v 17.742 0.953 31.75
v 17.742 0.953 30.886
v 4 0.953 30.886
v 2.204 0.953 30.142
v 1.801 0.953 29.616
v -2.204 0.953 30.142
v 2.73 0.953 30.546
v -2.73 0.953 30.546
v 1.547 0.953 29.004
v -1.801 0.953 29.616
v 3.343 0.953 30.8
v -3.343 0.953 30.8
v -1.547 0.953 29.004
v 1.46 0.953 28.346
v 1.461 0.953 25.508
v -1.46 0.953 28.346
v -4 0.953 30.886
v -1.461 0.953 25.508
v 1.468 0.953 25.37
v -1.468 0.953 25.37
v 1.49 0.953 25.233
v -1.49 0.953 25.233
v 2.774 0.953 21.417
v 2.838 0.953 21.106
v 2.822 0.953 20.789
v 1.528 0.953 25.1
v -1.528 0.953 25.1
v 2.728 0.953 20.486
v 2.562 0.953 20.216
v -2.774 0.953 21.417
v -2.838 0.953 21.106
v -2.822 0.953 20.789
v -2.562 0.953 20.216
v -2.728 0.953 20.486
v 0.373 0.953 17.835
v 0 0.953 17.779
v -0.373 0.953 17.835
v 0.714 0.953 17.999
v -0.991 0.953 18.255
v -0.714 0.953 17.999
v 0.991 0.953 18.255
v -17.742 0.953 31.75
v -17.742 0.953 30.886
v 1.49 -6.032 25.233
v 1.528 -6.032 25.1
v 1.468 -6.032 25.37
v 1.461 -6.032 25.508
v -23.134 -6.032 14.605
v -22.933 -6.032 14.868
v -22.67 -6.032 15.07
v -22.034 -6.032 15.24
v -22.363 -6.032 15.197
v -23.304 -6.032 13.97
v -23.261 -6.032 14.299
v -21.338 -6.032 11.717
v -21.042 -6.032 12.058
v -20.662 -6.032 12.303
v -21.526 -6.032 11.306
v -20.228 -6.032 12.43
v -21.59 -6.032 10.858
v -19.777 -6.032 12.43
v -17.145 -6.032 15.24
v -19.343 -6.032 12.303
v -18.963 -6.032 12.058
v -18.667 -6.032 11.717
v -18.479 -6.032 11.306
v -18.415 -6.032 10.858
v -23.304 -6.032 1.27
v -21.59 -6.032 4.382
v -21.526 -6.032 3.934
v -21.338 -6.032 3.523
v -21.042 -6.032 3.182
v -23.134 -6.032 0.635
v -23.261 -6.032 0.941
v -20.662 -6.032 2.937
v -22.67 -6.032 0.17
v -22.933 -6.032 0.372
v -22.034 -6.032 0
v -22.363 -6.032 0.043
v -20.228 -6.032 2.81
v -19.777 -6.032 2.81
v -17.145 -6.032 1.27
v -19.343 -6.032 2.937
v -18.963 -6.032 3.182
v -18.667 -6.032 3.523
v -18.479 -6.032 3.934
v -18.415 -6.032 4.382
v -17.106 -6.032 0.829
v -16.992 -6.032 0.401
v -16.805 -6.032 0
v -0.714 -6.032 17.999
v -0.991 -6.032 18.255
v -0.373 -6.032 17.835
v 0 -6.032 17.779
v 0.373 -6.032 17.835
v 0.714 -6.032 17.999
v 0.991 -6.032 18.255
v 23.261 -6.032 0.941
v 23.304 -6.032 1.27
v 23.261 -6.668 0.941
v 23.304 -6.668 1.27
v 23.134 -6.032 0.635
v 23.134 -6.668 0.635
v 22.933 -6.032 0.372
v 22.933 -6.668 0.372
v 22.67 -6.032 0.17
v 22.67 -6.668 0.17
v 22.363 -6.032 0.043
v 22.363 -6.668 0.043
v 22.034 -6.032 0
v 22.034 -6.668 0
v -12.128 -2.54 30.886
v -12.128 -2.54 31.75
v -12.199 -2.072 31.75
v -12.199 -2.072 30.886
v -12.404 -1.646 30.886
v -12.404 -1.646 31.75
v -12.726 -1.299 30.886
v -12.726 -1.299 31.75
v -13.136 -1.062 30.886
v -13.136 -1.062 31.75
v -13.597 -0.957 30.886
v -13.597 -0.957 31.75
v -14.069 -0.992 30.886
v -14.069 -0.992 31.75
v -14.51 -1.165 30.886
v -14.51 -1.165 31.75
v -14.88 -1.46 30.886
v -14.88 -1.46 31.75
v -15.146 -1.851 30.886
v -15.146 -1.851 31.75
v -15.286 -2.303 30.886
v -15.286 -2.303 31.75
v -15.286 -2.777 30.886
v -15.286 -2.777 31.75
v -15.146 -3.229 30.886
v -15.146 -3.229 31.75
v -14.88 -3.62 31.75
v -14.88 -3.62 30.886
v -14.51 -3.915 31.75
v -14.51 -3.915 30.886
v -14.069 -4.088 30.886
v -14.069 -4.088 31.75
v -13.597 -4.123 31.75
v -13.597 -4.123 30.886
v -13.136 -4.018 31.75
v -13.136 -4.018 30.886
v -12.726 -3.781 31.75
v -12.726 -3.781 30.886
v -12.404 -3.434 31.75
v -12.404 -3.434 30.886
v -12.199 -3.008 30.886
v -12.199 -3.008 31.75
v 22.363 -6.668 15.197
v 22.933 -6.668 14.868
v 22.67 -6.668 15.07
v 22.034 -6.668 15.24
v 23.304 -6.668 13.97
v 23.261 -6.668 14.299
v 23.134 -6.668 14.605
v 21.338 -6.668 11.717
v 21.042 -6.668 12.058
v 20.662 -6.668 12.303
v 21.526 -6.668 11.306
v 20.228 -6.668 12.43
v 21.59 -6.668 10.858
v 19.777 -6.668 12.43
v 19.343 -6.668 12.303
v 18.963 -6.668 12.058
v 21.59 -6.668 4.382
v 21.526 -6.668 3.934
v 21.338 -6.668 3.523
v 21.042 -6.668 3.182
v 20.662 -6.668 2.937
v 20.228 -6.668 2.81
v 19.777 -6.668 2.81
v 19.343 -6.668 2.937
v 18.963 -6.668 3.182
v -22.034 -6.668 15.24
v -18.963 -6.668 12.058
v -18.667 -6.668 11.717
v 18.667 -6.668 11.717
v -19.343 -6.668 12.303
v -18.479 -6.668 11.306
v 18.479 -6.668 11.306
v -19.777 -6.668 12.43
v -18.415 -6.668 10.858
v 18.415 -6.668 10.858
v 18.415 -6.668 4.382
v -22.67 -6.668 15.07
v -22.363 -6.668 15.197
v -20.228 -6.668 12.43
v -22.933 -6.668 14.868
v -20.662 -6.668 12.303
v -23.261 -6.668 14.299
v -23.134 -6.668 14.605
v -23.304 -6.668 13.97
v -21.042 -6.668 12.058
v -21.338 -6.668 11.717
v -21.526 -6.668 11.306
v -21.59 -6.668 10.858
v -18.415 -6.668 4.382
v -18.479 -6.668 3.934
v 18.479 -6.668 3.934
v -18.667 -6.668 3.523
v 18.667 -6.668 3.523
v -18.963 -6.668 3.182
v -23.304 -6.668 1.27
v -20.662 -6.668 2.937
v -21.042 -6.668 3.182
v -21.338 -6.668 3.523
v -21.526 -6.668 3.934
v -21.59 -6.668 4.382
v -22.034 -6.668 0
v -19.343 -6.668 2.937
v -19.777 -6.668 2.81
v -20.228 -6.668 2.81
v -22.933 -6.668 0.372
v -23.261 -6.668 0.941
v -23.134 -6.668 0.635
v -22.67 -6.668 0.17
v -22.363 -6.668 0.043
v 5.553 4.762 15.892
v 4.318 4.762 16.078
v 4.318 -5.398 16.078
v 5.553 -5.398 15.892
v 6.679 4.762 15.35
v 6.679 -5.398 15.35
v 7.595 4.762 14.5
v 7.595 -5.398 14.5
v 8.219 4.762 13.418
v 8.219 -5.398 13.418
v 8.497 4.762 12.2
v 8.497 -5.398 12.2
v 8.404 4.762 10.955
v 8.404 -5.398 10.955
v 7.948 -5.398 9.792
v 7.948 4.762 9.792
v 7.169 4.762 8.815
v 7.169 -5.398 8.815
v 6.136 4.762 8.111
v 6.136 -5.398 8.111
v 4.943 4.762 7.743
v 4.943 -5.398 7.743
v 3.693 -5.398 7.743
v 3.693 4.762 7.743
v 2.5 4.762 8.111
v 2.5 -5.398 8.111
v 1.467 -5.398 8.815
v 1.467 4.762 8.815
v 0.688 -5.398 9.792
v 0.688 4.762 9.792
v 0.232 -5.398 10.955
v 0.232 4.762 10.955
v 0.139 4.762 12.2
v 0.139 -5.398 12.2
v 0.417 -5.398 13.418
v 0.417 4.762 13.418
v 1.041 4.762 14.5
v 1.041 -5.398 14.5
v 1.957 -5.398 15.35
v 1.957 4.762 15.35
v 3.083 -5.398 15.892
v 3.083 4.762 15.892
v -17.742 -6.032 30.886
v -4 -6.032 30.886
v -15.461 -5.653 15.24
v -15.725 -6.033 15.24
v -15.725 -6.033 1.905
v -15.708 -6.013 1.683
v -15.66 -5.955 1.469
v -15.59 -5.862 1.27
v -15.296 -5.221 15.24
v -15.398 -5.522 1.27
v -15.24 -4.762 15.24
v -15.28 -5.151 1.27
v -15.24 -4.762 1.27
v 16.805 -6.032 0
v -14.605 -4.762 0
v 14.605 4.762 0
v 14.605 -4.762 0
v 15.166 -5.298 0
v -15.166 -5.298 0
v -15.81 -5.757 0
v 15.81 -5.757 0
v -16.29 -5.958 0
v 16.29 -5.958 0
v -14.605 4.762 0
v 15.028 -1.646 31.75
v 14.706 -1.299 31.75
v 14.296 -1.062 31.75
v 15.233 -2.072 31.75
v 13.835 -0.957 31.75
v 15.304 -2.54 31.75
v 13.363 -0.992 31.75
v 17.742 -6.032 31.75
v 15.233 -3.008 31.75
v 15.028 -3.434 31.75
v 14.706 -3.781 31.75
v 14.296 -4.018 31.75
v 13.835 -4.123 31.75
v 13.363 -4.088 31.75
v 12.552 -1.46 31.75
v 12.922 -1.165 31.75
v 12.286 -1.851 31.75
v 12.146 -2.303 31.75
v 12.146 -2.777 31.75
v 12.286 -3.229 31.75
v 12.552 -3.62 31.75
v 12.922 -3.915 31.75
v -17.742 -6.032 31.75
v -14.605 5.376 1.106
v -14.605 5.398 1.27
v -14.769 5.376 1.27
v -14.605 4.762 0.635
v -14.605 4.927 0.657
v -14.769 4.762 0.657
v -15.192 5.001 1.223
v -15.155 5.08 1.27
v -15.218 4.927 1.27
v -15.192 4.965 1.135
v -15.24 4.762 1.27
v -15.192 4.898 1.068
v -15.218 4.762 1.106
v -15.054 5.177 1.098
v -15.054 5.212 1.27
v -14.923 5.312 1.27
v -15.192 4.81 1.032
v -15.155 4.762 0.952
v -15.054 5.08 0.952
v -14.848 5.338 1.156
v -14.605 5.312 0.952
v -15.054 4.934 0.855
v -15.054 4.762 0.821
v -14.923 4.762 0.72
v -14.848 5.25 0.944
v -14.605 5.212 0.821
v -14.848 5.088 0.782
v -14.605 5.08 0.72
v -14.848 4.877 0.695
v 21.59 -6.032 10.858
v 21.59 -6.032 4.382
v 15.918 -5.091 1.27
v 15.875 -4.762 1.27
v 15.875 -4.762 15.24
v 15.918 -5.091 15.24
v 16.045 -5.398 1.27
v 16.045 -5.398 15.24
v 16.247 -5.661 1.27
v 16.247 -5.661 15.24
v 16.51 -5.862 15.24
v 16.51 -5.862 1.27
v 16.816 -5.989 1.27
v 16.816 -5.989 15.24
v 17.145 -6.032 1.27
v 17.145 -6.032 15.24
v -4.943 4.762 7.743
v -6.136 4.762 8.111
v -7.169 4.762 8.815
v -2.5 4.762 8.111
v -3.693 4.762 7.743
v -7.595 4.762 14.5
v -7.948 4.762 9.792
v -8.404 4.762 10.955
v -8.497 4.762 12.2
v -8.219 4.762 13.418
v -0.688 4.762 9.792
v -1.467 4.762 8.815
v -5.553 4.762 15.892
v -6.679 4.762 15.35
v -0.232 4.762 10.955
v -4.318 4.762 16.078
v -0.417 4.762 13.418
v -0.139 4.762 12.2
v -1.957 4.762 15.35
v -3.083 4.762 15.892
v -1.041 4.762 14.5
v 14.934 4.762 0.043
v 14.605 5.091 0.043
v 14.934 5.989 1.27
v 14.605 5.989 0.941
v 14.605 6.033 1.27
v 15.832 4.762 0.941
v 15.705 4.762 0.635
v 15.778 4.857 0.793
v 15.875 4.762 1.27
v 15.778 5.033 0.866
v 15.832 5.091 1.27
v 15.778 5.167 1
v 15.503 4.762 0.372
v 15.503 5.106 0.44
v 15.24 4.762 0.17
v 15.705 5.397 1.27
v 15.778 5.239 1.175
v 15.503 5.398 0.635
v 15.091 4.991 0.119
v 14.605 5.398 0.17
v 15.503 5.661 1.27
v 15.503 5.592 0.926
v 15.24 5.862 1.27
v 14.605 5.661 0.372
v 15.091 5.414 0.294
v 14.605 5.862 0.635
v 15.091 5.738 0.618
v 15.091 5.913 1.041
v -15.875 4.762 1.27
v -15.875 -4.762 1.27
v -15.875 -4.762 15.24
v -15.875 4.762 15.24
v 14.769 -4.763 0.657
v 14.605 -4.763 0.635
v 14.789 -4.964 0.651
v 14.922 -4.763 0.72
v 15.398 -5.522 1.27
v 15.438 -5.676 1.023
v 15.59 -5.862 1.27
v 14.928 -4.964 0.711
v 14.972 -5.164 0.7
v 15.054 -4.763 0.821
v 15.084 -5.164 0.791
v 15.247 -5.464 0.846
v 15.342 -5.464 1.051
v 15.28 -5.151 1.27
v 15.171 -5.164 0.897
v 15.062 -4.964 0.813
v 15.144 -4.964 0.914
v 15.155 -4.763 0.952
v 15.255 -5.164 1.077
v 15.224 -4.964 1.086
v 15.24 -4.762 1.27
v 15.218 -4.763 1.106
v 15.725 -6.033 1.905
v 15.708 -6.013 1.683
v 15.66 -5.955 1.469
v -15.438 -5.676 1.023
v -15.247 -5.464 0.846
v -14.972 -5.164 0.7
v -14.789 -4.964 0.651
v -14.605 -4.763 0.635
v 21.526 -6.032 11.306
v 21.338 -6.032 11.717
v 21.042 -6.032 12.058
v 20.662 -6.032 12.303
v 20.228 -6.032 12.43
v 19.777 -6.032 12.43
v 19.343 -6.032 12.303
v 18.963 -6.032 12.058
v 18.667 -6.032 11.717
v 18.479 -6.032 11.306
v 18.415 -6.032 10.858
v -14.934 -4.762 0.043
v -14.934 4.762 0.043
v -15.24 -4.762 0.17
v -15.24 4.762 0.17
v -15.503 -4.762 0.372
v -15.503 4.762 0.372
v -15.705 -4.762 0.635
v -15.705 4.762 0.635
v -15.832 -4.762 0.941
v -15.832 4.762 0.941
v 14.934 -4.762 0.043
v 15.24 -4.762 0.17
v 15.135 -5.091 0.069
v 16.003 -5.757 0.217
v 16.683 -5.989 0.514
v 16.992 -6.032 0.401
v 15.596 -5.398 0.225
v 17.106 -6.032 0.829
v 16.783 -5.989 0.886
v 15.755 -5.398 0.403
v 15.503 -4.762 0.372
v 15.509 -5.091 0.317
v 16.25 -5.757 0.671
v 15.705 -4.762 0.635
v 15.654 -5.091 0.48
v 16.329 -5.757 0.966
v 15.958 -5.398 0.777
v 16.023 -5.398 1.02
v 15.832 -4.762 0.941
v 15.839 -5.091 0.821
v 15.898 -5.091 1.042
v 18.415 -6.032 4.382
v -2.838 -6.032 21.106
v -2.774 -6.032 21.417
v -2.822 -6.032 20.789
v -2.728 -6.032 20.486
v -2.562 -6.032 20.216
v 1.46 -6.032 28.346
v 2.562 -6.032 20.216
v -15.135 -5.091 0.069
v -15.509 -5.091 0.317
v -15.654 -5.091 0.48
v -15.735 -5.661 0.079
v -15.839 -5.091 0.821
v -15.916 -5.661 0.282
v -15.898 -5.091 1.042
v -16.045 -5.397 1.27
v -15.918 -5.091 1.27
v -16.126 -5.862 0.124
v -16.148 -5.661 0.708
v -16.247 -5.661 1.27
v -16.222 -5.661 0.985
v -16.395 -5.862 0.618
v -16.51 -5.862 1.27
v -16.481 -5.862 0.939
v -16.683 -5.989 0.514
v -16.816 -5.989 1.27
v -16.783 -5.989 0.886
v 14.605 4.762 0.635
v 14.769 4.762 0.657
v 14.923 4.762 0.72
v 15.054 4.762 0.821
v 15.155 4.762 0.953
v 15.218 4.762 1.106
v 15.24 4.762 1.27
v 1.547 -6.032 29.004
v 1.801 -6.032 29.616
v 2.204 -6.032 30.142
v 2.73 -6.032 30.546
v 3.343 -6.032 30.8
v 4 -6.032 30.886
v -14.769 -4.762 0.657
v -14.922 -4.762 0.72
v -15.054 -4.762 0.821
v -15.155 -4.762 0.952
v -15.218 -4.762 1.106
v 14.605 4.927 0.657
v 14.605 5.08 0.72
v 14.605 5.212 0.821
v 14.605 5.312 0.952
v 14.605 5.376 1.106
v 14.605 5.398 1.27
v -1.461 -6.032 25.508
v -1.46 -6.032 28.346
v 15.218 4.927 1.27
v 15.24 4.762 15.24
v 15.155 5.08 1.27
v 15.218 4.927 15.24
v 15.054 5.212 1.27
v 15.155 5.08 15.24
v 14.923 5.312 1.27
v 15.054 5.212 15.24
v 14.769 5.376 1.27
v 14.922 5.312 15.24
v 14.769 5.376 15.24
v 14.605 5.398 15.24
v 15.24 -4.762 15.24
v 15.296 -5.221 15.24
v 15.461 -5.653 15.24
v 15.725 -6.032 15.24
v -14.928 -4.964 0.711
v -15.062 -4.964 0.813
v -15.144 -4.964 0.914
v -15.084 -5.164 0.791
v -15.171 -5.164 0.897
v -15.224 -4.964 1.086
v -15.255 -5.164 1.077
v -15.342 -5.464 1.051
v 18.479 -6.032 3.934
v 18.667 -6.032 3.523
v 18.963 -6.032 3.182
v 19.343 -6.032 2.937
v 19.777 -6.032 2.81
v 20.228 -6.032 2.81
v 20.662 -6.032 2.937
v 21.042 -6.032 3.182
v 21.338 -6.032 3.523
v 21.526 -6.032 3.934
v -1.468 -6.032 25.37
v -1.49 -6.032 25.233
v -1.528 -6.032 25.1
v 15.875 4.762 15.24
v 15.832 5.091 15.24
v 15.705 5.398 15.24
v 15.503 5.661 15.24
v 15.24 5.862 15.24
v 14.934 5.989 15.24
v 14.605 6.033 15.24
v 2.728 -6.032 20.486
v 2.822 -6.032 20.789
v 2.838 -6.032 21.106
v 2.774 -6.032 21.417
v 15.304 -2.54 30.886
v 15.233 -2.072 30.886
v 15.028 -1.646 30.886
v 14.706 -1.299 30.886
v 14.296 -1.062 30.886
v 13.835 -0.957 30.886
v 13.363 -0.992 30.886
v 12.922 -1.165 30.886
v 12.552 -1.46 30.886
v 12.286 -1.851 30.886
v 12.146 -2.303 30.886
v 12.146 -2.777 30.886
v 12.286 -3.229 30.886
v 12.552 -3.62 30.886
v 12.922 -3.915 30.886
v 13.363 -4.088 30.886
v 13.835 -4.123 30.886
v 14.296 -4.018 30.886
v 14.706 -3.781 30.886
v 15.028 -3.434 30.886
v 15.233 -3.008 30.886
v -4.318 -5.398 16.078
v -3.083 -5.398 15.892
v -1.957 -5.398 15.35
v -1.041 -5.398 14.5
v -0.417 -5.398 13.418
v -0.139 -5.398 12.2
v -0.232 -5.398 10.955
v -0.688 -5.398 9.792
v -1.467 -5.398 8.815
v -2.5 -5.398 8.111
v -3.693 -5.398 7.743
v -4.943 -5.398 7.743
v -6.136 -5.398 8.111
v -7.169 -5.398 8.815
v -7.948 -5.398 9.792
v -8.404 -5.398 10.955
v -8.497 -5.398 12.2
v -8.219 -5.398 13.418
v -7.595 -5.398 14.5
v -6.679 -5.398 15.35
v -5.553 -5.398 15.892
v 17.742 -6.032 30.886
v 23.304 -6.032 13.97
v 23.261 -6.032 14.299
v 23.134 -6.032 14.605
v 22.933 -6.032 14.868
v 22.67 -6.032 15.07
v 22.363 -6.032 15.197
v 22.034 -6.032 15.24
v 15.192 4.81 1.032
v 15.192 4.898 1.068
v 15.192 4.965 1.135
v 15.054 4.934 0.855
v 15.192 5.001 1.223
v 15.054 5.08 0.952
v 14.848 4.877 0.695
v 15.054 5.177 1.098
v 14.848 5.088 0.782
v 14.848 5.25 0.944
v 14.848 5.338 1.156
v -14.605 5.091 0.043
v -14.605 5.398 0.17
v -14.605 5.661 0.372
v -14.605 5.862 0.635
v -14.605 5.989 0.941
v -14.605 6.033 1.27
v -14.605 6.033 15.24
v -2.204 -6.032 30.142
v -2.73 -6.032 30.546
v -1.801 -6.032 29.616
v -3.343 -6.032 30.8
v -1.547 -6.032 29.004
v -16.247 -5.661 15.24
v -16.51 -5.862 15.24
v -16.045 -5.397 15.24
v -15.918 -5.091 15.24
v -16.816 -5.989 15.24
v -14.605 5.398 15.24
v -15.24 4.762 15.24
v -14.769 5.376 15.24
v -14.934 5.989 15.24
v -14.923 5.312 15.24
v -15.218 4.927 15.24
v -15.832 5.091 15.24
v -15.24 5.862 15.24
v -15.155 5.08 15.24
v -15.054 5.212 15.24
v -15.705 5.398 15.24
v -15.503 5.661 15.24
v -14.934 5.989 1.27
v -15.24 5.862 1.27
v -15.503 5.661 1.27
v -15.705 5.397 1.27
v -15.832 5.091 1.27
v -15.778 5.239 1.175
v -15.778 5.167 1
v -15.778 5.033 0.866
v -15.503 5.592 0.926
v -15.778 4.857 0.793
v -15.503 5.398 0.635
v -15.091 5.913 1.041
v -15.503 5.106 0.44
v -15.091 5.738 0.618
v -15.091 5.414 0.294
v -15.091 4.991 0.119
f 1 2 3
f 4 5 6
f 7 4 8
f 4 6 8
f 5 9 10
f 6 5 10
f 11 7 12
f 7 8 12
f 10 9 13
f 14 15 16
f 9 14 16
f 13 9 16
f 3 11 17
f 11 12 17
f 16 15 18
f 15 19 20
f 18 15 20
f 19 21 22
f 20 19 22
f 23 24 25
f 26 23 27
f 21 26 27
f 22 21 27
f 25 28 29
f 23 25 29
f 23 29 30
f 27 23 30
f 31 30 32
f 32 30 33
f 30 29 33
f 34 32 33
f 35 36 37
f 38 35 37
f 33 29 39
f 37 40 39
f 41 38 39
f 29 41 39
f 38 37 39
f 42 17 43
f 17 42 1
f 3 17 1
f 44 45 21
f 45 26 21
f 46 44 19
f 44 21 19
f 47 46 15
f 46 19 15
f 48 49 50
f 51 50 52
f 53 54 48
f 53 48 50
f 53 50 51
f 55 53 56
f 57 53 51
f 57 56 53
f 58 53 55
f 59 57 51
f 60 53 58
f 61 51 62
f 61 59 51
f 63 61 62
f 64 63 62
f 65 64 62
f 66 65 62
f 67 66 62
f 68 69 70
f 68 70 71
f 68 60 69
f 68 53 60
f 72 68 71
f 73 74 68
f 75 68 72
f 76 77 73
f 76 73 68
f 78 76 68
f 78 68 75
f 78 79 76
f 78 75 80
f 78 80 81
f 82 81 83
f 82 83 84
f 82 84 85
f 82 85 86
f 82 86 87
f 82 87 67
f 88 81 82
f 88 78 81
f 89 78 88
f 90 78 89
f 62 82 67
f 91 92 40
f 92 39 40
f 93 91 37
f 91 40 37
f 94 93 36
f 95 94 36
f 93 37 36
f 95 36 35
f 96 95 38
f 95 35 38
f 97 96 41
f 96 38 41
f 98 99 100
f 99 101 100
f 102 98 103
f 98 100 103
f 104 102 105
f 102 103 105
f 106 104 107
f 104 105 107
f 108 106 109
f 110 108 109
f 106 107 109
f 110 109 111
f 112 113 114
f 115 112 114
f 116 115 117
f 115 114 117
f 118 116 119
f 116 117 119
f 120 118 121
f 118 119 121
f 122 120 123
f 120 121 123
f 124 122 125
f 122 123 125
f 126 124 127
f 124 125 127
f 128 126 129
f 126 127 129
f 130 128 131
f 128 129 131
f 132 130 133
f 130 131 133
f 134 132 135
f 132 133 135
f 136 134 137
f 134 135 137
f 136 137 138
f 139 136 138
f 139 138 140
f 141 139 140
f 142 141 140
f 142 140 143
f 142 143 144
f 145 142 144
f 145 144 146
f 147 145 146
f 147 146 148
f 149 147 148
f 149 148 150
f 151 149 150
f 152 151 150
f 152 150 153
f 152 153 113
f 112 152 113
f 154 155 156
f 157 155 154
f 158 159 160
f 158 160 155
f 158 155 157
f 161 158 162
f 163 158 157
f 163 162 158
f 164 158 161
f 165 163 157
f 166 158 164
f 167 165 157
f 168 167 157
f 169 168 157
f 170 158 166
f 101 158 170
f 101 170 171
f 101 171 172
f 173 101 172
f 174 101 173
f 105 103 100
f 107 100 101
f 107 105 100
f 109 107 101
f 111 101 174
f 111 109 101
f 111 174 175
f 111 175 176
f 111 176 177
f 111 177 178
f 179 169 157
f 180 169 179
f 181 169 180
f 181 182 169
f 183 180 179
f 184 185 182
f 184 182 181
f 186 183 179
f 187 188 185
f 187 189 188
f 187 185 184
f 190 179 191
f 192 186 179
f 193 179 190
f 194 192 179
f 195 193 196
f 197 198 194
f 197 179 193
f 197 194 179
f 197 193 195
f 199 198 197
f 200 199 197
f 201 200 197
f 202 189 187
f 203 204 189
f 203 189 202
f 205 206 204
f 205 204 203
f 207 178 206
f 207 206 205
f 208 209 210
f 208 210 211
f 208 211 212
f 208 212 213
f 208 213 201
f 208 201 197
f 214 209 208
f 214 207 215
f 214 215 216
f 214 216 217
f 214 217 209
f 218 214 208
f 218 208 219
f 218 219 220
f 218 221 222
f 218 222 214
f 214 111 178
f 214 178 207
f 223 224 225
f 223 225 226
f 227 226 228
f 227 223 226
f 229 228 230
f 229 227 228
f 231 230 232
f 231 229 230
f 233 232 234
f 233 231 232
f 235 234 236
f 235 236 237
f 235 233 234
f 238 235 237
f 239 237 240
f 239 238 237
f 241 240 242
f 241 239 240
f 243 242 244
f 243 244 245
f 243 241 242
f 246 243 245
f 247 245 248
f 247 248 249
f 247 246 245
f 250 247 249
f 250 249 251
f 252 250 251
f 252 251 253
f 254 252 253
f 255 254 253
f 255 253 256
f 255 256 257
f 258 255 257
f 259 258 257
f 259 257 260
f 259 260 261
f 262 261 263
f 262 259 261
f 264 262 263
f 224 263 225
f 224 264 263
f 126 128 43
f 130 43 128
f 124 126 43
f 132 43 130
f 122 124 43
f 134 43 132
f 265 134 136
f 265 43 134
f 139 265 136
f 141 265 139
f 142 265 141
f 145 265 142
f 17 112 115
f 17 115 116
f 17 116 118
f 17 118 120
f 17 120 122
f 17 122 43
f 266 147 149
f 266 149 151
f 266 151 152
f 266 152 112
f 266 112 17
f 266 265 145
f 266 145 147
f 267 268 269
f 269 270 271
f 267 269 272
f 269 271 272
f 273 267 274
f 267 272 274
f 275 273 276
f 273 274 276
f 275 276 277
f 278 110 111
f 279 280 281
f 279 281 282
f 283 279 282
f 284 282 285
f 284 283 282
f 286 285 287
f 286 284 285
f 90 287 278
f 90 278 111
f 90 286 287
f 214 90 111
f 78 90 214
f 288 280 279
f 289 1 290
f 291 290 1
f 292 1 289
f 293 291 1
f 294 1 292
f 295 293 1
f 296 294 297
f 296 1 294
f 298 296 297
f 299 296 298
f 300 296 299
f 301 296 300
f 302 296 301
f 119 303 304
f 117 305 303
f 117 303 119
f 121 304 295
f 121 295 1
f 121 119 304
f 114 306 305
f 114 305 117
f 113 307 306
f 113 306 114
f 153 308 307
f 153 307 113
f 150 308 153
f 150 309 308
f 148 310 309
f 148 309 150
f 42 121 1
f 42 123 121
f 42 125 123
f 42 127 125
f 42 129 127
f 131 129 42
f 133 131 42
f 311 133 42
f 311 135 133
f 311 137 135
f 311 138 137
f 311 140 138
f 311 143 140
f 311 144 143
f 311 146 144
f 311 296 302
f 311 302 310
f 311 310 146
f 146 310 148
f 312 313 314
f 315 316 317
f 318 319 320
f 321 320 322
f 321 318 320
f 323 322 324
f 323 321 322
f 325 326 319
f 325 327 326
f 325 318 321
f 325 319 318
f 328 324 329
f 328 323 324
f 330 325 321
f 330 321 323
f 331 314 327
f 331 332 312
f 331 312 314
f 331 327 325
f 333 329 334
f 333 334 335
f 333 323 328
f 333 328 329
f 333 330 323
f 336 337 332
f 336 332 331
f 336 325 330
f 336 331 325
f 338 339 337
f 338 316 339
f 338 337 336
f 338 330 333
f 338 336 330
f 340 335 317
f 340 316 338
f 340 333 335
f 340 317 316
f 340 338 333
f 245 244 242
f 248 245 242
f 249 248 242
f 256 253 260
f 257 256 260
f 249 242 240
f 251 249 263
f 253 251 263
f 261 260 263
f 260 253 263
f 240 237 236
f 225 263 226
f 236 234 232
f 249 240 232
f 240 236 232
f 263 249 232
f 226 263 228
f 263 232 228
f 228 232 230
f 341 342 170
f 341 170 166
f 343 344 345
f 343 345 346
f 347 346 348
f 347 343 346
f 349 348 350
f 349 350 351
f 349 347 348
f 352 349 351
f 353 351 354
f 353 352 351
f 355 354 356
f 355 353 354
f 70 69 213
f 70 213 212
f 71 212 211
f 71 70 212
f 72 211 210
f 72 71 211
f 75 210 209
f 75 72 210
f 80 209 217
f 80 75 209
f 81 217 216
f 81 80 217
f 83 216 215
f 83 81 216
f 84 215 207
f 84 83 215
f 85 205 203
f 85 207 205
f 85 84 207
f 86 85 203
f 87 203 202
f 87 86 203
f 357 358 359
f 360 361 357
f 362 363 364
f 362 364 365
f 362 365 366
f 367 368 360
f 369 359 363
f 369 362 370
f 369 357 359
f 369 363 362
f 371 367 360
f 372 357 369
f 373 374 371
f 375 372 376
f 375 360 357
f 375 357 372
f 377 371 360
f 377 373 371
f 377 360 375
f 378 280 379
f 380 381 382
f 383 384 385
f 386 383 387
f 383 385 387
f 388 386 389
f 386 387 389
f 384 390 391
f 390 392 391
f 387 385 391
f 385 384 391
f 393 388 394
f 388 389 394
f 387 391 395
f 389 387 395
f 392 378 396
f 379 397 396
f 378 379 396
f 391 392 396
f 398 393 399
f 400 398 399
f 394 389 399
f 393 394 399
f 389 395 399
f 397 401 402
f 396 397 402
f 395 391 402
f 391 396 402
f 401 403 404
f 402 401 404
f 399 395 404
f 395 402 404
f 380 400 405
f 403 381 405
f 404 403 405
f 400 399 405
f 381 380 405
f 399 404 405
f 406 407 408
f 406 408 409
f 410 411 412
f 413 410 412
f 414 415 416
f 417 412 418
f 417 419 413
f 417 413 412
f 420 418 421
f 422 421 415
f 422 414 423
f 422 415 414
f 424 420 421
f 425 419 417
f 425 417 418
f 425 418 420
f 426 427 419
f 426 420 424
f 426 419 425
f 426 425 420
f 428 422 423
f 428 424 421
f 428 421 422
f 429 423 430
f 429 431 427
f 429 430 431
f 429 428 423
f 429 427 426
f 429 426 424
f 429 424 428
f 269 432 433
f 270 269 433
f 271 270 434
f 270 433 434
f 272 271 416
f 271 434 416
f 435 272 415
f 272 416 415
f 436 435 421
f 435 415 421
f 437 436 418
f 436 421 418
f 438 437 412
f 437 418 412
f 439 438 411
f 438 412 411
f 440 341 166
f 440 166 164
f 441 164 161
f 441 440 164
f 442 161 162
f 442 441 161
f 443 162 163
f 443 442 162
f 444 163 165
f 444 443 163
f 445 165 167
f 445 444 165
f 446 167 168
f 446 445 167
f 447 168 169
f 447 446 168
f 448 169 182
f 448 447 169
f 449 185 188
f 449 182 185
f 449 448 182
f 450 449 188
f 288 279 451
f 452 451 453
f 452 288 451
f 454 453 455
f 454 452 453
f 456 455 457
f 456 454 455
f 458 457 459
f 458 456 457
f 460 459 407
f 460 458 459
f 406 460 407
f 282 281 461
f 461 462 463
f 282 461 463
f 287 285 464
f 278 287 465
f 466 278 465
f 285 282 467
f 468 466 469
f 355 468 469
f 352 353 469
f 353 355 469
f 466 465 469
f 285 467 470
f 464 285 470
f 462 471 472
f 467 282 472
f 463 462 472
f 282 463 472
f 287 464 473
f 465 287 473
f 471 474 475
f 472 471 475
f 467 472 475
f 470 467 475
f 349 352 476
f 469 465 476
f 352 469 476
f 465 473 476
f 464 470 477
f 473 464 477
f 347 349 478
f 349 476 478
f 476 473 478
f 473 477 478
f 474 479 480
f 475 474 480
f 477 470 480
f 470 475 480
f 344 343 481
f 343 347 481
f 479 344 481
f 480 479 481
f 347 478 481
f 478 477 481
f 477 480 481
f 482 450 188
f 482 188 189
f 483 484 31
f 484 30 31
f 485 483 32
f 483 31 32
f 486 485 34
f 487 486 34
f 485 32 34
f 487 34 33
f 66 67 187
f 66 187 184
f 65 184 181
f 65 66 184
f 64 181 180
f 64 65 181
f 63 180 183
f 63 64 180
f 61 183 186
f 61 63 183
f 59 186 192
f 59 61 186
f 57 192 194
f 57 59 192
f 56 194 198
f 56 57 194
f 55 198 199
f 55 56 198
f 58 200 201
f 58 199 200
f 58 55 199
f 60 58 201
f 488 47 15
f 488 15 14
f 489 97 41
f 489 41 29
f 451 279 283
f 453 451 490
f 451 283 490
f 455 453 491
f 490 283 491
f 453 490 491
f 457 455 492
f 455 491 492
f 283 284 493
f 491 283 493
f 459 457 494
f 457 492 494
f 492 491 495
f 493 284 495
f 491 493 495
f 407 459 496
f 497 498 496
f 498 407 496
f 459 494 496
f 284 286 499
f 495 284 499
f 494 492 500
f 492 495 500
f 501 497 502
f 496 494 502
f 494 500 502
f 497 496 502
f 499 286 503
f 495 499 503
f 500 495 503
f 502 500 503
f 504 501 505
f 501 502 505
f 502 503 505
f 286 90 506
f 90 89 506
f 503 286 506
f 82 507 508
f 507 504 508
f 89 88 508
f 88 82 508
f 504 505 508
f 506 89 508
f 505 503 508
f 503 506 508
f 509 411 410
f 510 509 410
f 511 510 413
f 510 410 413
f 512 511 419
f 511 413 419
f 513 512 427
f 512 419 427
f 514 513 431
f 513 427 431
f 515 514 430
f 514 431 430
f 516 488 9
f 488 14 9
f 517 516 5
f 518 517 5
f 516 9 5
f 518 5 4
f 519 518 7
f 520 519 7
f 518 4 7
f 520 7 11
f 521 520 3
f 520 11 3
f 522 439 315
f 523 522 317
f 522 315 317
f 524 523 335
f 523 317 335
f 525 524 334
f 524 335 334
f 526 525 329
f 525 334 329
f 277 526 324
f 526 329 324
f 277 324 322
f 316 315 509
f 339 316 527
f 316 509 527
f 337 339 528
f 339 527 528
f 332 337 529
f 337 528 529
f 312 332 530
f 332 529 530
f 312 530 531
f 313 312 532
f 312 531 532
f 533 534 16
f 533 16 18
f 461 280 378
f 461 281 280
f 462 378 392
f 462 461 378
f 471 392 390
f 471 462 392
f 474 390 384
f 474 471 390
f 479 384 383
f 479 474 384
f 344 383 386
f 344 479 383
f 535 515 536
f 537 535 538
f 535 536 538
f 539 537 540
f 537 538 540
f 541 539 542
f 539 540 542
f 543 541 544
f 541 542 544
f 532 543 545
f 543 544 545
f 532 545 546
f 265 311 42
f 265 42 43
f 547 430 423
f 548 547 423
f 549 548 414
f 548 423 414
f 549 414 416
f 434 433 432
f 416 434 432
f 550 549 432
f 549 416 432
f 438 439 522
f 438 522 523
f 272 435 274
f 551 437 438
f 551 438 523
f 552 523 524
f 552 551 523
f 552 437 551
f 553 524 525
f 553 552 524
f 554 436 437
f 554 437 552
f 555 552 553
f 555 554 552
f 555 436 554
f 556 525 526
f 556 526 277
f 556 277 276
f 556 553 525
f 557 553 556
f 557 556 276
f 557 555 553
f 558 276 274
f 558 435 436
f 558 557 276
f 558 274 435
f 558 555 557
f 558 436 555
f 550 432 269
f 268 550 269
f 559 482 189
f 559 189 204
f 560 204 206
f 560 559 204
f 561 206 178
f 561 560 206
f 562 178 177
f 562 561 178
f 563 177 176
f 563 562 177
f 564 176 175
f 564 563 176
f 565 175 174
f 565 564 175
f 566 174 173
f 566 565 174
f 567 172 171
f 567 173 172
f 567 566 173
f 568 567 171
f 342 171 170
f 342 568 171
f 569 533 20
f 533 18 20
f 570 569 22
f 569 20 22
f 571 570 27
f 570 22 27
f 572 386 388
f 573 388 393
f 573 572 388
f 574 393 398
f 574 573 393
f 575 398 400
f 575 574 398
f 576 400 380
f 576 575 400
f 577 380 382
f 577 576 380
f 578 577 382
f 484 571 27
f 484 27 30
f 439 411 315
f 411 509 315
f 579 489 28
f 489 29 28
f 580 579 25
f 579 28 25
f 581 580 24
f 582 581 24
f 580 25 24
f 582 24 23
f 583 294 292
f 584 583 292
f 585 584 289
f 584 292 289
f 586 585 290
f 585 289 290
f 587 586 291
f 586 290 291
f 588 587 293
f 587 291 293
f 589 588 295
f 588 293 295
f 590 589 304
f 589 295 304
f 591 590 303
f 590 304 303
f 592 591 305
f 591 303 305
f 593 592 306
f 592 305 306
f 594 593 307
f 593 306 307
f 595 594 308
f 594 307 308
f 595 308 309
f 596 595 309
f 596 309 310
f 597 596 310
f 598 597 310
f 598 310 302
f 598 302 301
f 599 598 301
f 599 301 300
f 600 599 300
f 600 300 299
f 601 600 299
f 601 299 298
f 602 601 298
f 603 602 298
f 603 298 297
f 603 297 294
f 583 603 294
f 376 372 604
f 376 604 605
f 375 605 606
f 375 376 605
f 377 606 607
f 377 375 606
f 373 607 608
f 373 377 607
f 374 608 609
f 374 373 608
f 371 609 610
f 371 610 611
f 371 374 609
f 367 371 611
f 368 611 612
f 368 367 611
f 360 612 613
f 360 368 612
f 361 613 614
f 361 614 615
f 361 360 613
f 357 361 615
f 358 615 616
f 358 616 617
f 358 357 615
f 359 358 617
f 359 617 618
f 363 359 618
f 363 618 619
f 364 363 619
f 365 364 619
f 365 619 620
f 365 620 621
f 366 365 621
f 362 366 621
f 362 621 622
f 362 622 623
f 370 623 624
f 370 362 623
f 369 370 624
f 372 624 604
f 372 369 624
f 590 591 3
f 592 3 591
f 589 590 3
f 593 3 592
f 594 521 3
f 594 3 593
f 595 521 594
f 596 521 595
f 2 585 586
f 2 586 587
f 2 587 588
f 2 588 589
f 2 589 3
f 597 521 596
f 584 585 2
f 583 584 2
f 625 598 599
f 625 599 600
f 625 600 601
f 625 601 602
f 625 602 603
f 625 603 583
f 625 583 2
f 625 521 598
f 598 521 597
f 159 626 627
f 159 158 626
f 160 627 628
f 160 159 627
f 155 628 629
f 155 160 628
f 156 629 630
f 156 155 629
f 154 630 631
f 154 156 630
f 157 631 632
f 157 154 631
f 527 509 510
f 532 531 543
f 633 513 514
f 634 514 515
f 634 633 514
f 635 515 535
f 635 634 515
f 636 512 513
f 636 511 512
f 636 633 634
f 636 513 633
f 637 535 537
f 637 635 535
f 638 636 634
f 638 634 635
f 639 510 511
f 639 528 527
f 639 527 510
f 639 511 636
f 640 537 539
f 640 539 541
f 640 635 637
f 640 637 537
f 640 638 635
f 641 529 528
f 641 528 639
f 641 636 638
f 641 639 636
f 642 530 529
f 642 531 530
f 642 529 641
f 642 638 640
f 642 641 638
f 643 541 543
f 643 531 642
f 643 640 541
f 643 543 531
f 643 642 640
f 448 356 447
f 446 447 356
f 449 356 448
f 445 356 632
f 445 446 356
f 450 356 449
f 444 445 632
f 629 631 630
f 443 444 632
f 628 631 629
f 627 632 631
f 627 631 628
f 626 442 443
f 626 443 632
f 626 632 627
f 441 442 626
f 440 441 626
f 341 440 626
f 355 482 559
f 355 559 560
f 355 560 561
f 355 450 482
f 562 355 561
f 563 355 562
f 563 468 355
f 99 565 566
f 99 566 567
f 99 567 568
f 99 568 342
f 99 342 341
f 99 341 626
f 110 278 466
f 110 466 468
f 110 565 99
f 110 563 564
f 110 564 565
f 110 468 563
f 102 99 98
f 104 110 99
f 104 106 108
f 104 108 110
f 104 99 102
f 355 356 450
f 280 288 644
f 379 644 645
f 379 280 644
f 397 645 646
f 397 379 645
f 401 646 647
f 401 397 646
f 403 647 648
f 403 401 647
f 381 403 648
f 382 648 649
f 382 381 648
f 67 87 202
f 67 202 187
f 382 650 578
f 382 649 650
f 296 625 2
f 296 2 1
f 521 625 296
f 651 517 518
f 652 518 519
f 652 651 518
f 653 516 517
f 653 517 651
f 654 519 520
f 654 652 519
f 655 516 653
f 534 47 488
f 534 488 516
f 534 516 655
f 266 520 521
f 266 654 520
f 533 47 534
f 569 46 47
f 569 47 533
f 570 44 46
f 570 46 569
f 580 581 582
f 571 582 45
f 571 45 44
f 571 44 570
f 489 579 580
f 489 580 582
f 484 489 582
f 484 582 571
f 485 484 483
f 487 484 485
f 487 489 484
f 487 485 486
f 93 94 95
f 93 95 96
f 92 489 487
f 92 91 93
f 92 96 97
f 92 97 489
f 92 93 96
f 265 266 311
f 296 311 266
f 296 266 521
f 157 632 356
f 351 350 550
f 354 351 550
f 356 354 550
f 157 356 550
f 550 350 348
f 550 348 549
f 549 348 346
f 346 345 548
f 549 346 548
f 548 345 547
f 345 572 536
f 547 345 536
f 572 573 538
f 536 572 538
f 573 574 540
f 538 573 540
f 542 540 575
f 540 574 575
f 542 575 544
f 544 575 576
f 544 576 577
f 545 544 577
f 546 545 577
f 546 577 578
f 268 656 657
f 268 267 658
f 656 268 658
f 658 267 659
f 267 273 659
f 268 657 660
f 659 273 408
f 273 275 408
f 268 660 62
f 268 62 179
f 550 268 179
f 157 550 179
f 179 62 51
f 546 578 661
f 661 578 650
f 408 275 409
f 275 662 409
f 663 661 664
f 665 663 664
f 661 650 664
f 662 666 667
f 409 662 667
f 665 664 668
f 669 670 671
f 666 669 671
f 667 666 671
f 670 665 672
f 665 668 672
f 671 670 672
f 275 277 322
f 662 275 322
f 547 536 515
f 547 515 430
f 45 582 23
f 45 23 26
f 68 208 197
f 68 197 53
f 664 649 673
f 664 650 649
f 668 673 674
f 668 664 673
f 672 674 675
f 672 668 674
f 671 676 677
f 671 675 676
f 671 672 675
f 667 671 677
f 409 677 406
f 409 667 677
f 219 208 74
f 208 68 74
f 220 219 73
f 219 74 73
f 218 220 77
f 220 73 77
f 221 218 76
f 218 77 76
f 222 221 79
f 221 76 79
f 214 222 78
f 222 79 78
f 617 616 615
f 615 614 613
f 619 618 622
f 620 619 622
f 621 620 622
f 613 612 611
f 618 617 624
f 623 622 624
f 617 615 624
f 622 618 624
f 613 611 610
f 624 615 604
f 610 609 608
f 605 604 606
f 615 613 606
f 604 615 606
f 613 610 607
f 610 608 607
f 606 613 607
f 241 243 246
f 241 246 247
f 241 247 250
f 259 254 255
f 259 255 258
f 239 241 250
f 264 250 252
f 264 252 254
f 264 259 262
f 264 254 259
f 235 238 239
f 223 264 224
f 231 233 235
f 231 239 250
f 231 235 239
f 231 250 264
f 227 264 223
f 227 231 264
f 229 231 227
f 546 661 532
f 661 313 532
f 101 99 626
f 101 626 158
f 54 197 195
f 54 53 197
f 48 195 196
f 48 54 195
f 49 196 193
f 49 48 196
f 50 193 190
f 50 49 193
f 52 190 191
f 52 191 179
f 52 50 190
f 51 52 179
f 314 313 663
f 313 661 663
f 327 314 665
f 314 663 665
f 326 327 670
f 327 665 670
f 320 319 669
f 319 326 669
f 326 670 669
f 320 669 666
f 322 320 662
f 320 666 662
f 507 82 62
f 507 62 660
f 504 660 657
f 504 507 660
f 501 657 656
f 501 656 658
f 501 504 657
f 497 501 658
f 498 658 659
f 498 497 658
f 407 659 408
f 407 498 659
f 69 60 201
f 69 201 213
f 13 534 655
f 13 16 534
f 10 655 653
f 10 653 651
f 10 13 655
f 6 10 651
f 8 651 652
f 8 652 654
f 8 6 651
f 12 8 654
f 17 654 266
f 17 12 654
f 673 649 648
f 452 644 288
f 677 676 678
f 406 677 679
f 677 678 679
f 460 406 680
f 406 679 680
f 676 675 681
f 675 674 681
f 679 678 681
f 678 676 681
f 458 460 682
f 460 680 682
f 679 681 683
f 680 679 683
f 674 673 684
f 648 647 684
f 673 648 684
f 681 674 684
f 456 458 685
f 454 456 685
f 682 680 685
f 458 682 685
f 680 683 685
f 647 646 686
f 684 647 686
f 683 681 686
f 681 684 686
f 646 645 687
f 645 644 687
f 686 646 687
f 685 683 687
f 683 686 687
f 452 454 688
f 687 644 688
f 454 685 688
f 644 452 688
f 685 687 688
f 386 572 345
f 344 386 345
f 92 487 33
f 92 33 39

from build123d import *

# Parameters (mm, degrees)
BOSS_EXTRUDE1_DEPTH   = 15.24
FILLET1_R             = 1.27
FILLET3_R             = 1.27
FILLET2_R             = 1.27
CUT_EXTRUDE1_DEPTH    = 31.346689198
BOSS_EXTRUDE2_START   = -1.27
SKETCH4_R             = 4.191
BOSS_EXTRUDE2_DEPTH   = 10.16
BOSS_EXTRUDE2_2_DEPTH = 10.16
SHELL1_T              = -0.635
FILLET6_R             = 1.27
BOSS_EXTRUDE3_DEPTH   = 6.985
FILLET7_R             = 2.54
FILLET8_R             = 1.27
SKETCH6_R             = 1.5875
CUT_EXTRUDE2_DEPTH    = 40.945184743


with BuildPart() as part:
    # Sketch2 → Boss-Extrude1 (new body)
    with BuildSketch(Plane.XY):
        Polygon((15.875, -6.0325), (23.3045, -6.0325), (23.3045, -6.6675), (-23.3045, -6.6675), (-23.3045, -6.0325), (-15.875, -6.0325), (-15.875, 6.0325), (15.875, 6.0325), align=None)
    extrude(amount=BOSS_EXTRUDE1_DEPTH)

    # Fillet1
    fillet1_edges = [part.edges().sort_by_distance(p)[0] for p in [
        (-23.3045, -6.35, 15.24),
        (23.3045, -6.35, 15.24),
        (23.3045, -6.35, 0),
        (-23.3045, -6.35, 0),
    ]]
    fillet(fillet1_edges, radius=FILLET1_R)

    # Fillet3
    fillet3_edges = [part.edges().sort_by_distance(p)[0] for p in [
        (0, 6.0325, 0),
        (15.875, 0, 0),
        (-15.875, 6.0325, 7.62),
        (15.875, 6.0325, 7.62),
        (-15.875, 0, 0),
    ]]
    fillet(fillet3_edges, radius=FILLET3_R)

    # Fillet2
    # the kernel refuses this fillet: 1.27 mm, written as the material it adds along each edge
    with BuildSketch(Plane(origin=(15.875, -6.0325, 1.27), x_dir=(1, 0, 0), z_dir=(0, 0, 1)), Plane(origin=(-15.875, -6.0325, 1.27), x_dir=(0, 1, 0), z_dir=(0, 0, 1))) as fillet2_piece_1:
        with BuildLine():
            CenterArc((FILLET2_R, FILLET2_R), FILLET2_R, 180, 90)
            Line((0, FILLET2_R), (0, 0))
            Line((0, 0), (FILLET2_R, 0))
        make_face()
    extrude(amount=13.97)
    with BuildSketch(Plane(origin=(14.605, -6.0325, 1.27), x_dir=(-0.5976672776328289, 0, 0.8017442392976473), z_dir=(0.8017442392976473, 0, 0.5976672776328289))) as fillet2_piece_2_section:
        with BuildLine():
            CenterArc((1.27 + FILLET2_R, -FILLET2_R), FILLET2_R, 90, 90)
            Line((1.27, -FILLET2_R), (1.27, 0))
            Line((1.27, 0), (1.27 + FILLET2_R, 0))
        make_face()
    fillet2_piece_2 = revolve(axis=Axis((14.605, -6.0325, 1.27), (0, -1, 0)), revolution_arc=233.296989237, mode=Mode.PRIVATE)
    fillet2_piece_2 = split(fillet2_piece_2, bisect_by=Plane(origin=(15.557422349, -5.636731762, 0), z_dir=(0, 0, 1)), keep=Keep.TOP, mode=Mode.PRIVATE)
    add(fillet2_piece_2)
    with BuildSketch(Plane(origin=(-14.605, -6.0325, 1.27), x_dir=(0.5976672776328275, 0, 0.8017442392976483), z_dir=(-0.8017442392976483, 0, 0.5976672776328275))) as fillet2_piece_3_section:
        with BuildLine():
            CenterArc((1.27 + FILLET2_R, FILLET2_R), FILLET2_R, 180, 90)
            Line((1.27 + FILLET2_R, 0), (1.27, 0))
            Line((1.27, 0), (1.27, FILLET2_R))
        make_face()
    fillet2_piece_3 = revolve(axis=Axis((-14.605, -6.0325, 1.27), (0, 1, 0)), revolution_arc=233.296989237, mode=Mode.PRIVATE)
    fillet2_piece_3 = split(fillet2_piece_3, bisect_by=Plane(origin=(-15.557422462, -5.636732056, 0), z_dir=(0, 0, 1)), keep=Keep.TOP, mode=Mode.PRIVATE)
    add(fillet2_piece_3)

    # Sketch3 → Cut-Extrude1 (cut, through all)
    with BuildSketch(Plane(origin=(0, -6.0325, 0), x_dir=(1, 0, 0), z_dir=(0, 1, 0))):
        with BuildLine():
            Line((-18.415, -4.3815), (-18.415, -10.8585))
            ThreePointArc((-18.415, -10.8585), (-20.0025, -12.446), (-21.59, -10.8585))
            Line((-21.59, -10.8585), (-21.59, -4.3815))
            ThreePointArc((-21.59, -4.3815), (-20.0025, -2.794), (-18.415, -4.3815))
        make_face()
        with BuildLine():
            Line((21.59, -4.3815), (21.59, -10.8585))
            ThreePointArc((21.59, -10.8585), (20.0025, -12.446), (18.415, -10.8585))
            Line((18.415, -10.8585), (18.415, -4.3815))
            ThreePointArc((18.415, -4.3815), (20.0025, -2.794), (21.59, -4.3815))
        make_face()
    extrude(amount=-CUT_EXTRUDE1_DEPTH, mode=Mode.SUBTRACT)

    # Shell1
    shell1_openings = [part.faces().sort_by_distance(p)[0] for p in [
        (0, -0.451666987, 15.24),
    ]]
    offset(amount=SHELL1_T, openings=shell1_openings)

    # Fillet6
    fillet6_edges = [part.edges().sort_by_distance(p)[0] for p in [
        (0, -6.0325, 0.635),
    ]]
    fillet(fillet6_edges, radius=FILLET6_R)


with BuildPart() as body_2:
    # Sketch4 → Boss-Extrude2 (new body)
    with BuildSketch(Plane(origin=(0, 6.0325, 0), x_dir=(1, 0, 0), z_dir=(0, 1, 0)).offset(BOSS_EXTRUDE2_START)):
        with Locations(Location((-4.318, -11.8872, 0), (0, 0, 270))):
            Circle(SKETCH4_R)
    extrude(amount=-BOSS_EXTRUDE2_DEPTH)


with BuildPart() as body_3:
    # Sketch4 → Boss-Extrude2 2 (new body)
    with BuildSketch(Plane(origin=(0, 6.0325, 0), x_dir=(1, 0, 0), z_dir=(0, 1, 0)).offset(BOSS_EXTRUDE2_START)):
        with Locations(Location((4.318, -11.8872, 0), (0, 0, 270))):
            Circle(SKETCH4_R)
    extrude(amount=-BOSS_EXTRUDE2_2_DEPTH)


with BuildPart() as body_4:
    # Sketch5 → Boss-Extrude3 (new body)
    with BuildSketch(Plane(origin=(0, -6.0325, 0), x_dir=(1, 0, 0), z_dir=(0, 1, 0))):
        Polygon((-1.4605, -30.8864), (-1.4605, -25.2984), (-2.9972, -20.758354525), (0, -17.018), (2.9972, -20.758354525), (1.4605, -25.2984), (1.4605, -30.8864), (17.7419, -30.8864), (17.7419, -31.75), (-17.7419, -31.75), (-17.7419, -30.8864), align=None)
    extrude(amount=BOSS_EXTRUDE3_DEPTH)

    # Fillet7
    fillet7_edges = [body_4.edges().sort_by_distance(p)[0] for p in [
        (-1.4605, -2.54, 30.8864),
        (1.4605, -2.54, 30.8864),
    ]]
    fillet(fillet7_edges, radius=FILLET7_R)

    # Fillet8
    fillet8_edges = [body_4.edges().sort_by_distance(p)[0] for p in [
        (-1.4605, -2.54, 25.2984),
        (-2.9972, -2.54, 20.758354525),
        (0, -2.54, 17.018),
        (2.9972, -2.54, 20.758354525),
        (1.4605, -2.54, 25.2984),
    ]]
    fillet(fillet8_edges, radius=FILLET8_R)

    # Sketch6 → Cut-Extrude2 (cut, through all)
    with BuildSketch(Plane.XY.offset(31.75)):
        with Locations((-13.716, -2.54)):
            Circle(SKETCH6_R)
        with Locations((13.716, -2.54)):
            Circle(SKETCH6_R)
    extrude(amount=-CUT_EXTRUDE2_DEPTH, mode=Mode.SUBTRACT)


solid = Compound([part.part, body_2.part, body_3.part, body_4.part])
